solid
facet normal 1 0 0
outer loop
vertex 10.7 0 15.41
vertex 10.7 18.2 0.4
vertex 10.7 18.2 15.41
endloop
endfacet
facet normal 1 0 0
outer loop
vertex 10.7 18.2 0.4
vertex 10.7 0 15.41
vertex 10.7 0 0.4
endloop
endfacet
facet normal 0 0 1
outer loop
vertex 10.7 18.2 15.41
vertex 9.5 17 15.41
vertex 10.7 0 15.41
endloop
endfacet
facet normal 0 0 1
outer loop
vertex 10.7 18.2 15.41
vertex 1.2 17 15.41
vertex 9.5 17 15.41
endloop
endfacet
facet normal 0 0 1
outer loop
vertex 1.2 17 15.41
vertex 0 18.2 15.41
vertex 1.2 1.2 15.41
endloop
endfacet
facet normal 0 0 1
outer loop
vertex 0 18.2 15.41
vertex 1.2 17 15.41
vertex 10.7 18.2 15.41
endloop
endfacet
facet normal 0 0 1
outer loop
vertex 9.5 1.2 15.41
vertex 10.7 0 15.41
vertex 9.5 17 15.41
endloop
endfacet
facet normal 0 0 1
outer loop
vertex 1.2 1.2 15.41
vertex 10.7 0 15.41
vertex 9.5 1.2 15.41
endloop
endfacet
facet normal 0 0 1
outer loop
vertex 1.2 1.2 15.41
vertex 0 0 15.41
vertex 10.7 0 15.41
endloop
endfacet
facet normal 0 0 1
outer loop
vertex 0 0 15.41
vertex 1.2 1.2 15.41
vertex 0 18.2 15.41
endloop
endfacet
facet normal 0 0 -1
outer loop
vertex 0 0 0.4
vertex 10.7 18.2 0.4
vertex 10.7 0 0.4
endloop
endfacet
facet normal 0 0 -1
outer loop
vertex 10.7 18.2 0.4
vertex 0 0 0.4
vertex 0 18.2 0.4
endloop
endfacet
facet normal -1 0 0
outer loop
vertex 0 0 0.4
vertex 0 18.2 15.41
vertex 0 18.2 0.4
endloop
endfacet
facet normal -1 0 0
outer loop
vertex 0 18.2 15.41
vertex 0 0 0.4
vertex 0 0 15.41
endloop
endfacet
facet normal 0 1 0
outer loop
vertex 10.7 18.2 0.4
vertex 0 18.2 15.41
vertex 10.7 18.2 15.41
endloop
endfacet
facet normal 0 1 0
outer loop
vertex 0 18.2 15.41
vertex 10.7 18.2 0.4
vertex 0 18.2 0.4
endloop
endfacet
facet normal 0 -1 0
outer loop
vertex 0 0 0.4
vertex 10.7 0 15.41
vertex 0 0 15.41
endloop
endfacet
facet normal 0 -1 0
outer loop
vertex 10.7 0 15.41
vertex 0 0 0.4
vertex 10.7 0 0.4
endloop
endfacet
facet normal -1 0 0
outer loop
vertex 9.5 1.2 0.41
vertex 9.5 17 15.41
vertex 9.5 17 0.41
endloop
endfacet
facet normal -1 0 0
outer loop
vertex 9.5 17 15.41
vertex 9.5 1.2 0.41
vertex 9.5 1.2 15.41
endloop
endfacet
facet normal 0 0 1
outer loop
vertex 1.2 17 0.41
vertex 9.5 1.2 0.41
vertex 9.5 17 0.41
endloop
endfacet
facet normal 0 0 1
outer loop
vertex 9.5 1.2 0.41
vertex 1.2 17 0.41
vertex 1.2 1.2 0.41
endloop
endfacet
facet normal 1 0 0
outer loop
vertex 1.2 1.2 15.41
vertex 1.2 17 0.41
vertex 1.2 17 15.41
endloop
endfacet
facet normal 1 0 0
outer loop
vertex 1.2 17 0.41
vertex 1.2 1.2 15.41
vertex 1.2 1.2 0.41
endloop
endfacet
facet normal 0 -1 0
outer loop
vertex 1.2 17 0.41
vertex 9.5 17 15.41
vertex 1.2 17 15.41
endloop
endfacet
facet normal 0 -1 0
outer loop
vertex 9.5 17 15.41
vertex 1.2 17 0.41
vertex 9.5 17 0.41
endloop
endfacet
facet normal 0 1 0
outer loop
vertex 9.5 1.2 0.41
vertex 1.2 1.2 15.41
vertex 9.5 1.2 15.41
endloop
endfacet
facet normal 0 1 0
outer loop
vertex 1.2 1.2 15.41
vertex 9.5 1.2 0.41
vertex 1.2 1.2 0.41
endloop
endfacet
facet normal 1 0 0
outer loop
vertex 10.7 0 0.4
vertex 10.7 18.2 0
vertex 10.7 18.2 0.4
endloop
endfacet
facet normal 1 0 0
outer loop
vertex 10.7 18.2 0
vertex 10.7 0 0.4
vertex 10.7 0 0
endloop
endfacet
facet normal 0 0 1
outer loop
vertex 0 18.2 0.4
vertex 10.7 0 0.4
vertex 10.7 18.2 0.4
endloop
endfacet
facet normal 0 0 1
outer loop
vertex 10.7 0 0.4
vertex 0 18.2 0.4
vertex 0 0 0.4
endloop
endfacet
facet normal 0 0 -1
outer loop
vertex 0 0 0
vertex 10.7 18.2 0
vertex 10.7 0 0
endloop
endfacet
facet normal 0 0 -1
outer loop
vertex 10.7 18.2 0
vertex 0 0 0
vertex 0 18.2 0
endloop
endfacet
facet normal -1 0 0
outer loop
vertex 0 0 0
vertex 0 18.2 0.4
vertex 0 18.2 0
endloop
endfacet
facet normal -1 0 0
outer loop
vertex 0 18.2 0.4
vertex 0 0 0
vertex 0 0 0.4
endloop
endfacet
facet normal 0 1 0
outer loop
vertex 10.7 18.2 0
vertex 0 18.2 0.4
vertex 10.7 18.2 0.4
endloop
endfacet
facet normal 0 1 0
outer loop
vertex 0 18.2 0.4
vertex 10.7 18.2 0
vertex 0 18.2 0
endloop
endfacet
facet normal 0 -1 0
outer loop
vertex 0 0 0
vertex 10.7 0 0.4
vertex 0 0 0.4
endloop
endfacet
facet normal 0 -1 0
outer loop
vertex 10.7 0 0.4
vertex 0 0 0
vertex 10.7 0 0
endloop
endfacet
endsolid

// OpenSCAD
// file: ../../Base/Rotation.scad
// Fischertechnik Box Foundation
// Geometry Helpers Rotation

include <PlacementOptions.scad>

// getRotatedSpace(space, rotation=NoRotation)
// Rotates the space dependent on the specified rotation

function getRotatedSpace(space, rotation=NoRotation) = [
    (rotation == Rotate90 || rotation == Rotate270) ? space.y : space.x,
    (rotation == Rotate90 || rotation == Rotate270) ? space.x : space.y
];

// Rotates the given space around the fixed left lower corner
// space = the space the children needs as width/depth list [width,depth]
// rotation = 0 Rotate0 degrees, 1 Rotate90 degrees, 2 Rotate180 degrees, 3 Rotate270 degrees (equivalent to -90)

module RotateFix(space, rotation=NoRotation) {
    dy = (rotation == Rotate0 || rotation == Rotate270) ? 0 :
        (rotation == Rotate90) ? space.x :
        space.y;
    dx = (rotation < Rotate180) ? 0 :
        (rotation == Rotate180) ? space.x :
        space.y;
    
    translate([dx, dy, 0])
        rotate([0, 0, rotations[rotation]])
            children();
}
// file: ../../Base/Alignment.scad
// Fischertechnik Box Foundation
// Geometry Helpers Alignment

include <PlacementOptions.scad>

// getAlignedX(elementWidth, spaceWidth, align=AlignRight, offset=0)
// Gets the aligned X offset of an element with the given
// width in the given space.
// elementWidth = The width of the element to positon
// spaceWidth = The space where the element should be aligned
// align = 0 AlignLeft, 1 AlignCenter, 2 AlignRight
// offset = an optional offset from the aligned position. When
// aligned left or centered, then positive values are in X direction.
// When aligned right then positive values are in negative X direction.

function getAlignedX(elementWidth, spaceWidth, align=AlignRight, offset=0) =
    (align == AlignLeft) ?
        offset :
        ((align == AlignCenter) ?
        (spaceWidth - elementWidth)/2 + offset :
        spaceWidth - offset - elementWidth);

// getAlignedY(elementDepth, spaceDepth, align=AlignTop, offset=0)
// Gets the aligned Y offset of an element with the given
// depth in the given space.
// elementDepth = The depth of the element to positon
// spaceDepth = The space where the element should be aligned
// align = 0 AlignBottom, 1 AlignCenter, 2 AlignTop
// offset = an optional offset from the aligned position. When
// aligned bottom or centered, then positive values are in Y direction.
// When aligned top then positive values are in negative Y direction.

function getAlignedY(elementDepth, spaceDepth, align=AlignTop, offset=0) =
    (align == AlignBottom) ?
        offset :
        ((align == AlignCenter) ?
        (spaceDepth - elementDepth)/2 + offset :
        spaceDepth - offset - elementDepth);
// file: ../../Base/PlacementOptions.scad
// Fischertechnik Box Foundation
// Placement Options

// Alignment
NoAlign = 0;
AlignLeft = 1;
AlignBottom = 2;
AlignCenter = 3;
AlignRight = 4;
AlignTop = 5;

// Element rotation degree steps
rotations = [0, -90, -180, -270];

// Rotation
NoRotation = 0;
Rotate0 = 0;
Rotate90 = 1;
Rotate180 = 2;
Rotate270 = 3;

// Docking (seen from above)
NoDock = -1;
DockLeft = 0;
DockTop = 1;
DockRight = 2;
DockCorner = 2;
DockBottom = 3;

// Web corners
LowerLeft = 0;
UpperLeft = 1;
UpperRight = 2;
LowerRight = 3;

// Web position relative to corner
LeftOfCorner = 0;
RightOfCorner = 1;

// Rails direction
Horizontal = true;
Vertical = false;
// file: ../../Base/Boxes.scad
// Fischertechnik Box Foundation
// Pre-designed Boxes

use <Constants.scad>

include <PlacementOptions.scad>

box190Width = 190;
box190Depth = 130;
box130Width = 130;
box130Depth = 95;

// Values are from an original ec3 box
topBottomDifference = 1.5;
outerHeight = 40;
baseThickness = 1.8;
innerHeight = outerHeight - baseThickness;
stackExcess = 5.7;
radius = 3.5;
wallThickness = 1.5;
tolerance = 0.2;

boxWallThickness = wallThickness;
boxBaseThickness = baseThickness;
boxWebWidth = 3.0;

// getBoxWallThickness()
// Gets the wall thickness of a Fischertechnik Box
function getBoxWallThickness() = boxWallThickness;

// getBoxUsageHeight(height = 38.2)
// Gets the usable height of a Fischertechnik box
// height = Outer height of the box from the bottom to the upper edge.
function getBoxUsageHeight(height = outerHeight) = height - baseThickness - stackExcess;

// getBoxInnerHeight()
// Gets the inner height of a Fischertechnik box, including the stack excess
function getBoxInnerHeight() = innerHeight;

// getBoxBaseThickness()
// Gets the thickness of the Fischertechnik box base.
function getBoxBaseThickness() = boxBaseThickness;

// getBoxWebWidth()
// Gets the width of a box web
function getBoxWebWidth() = boxWebWidth;

// getBox190Space()
// Gets the usable inner space of a Box 190 as an x/y-list
function getBox190Space() = [
    box190Width - 2*getBoxWallThickness() - topBottomDifference, 
    box190Depth - 2*getBoxWallThickness() - topBottomDifference ];

// RoundedCornerPlate(width, depth, height, radius)
// Creates a body plate with rounded corners for a box. Used
// also to create the complete box with the hull module.
// width = Width of the plate
// depth = depth of the plate 
// height = thickness of the plate
// radius = radius of the rounded corner
module RoundedCornerPlate(width, depth, height, radius) {
    translate([radius, radius])
    hull() {
        w = width-2*radius;
        d = depth-2*radius;
        cube([w, d, height]);
        cylinder(height, r=radius, $fn=getFragments());
        translate([w, 0])
            cylinder(height, r=radius, $fn=getFragments());
        translate([w, d])
            cylinder(height, r=radius, $fn=getFragments());
        translate([0, d])
            cylinder(height, r=radius, $fn=getFragments());
    }
}

// BoxBase(width, depth)
// Creates an empty stackable Fischertechnik compatible box
// width = Outer width of the box (190, 130, ...)
// depth = Outer depth of the box (130, 95, ...)

module BoxBase(width, depth, height=outerHeight) {    
    thinPlate = 0.01;

    innerHeight = height - baseThickness;    
    
    module Body(tolerance=tolerance) {
        hull() {
            // Bottom with tolerance to fit into the original boxes when stacked
            translate([-wallThickness+tolerance, -wallThickness+tolerance, -baseThickness])
                RoundedCornerPlate(width-topBottomDifference-2*tolerance, depth-topBottomDifference-2*tolerance, thinPlate, radius);
            
            // Top
            translate([-wallThickness-topBottomDifference/2, -wallThickness-topBottomDifference/2, innerHeight-thinPlate])
                RoundedCornerPlate(width, depth, thinPlate, radius);
         }
    }

    module Cutoff() {
        hull() {
            coWidth = width - 2*wallThickness;
            coDepth = depth - 2*wallThickness;
            
            // Bottom
            RoundedCornerPlate(coWidth-topBottomDifference, coDepth-topBottomDifference, thinPlate, radius);

            // Top
            translate([-topBottomDifference/2, -topBottomDifference/2, innerHeight+thinPlate]) 
                RoundedCornerPlate(coWidth, coDepth, thinPlate, radius);
        }
    }
    
    difference() {        
        Body();
        Cutoff();
        stackOffset = innerHeight - stackExcess;
        translate([0, 0, stackOffset + baseThickness])
            Body(tolerance=0);
    }
}

// Creates the Fischertechnik empty box 130x190 mm and places it at position 0,0
// 190x130 are the outer sizes, the inner space is slightly smaller. Use getBox190Space() to get the inner sizes.
// The box is positioned that the usable inner space is at the 0,0,0 position.

module Box190() {
    BoxBase(box190Width, box190Depth);
}

// Gets the usable inner space of a Box 130 as an x/y-list
function getBox130Space() = [
    box130Width - 2*getBoxWallThickness() - topBottomDifference, 
    box130Depth - 2*getBoxWallThickness() - topBottomDifference ];

// Creates the Fischertechnik empty box 95x130 mm and places it at position 0,0
// 190x130 are the outer sizes, the inner space is slightly smaller. Use getBox190Space() to get the inner sizes.
// The box is positioned that the usable inner space is at the 0,0,0 position.

module Box130() {
    BoxBase(box130Width, box130Depth);
}

// Creates a web at the specified box walls
// corner 0 = LowerLeft, 1 = UpperLeft, 2 = UpperRight, 3 = LowerRight
// side 0 = LeftOfCorner, 1 = RightOfCorner
// distance = Distance in mm from the corner
// boxSpace = inner width and depth of the box (default: Box 190)
// webWidth = length of the web (default is 3 mms)
// webThickness = thickness of the web (default is 1 mm)
// height = Height of the web (standard is getBoxUsageHeight())
// sink = How much of the web is sunk into the wall

module BoxWeb(
    corner, 
    side, 
    distance, 
    boxSpace=getBox190Space(), 
    webWidth=getBoxWebWidth(), 
    webThickness=1.0, 
    height=getBoxUsageHeight(),
    sink = getBoxWallThickness()/2) {
    width = (corner % 2 == 0) ? 
            (side == LeftOfCorner ? webWidth : webThickness) :
            (side == LeftOfCorner ? webThickness : webWidth);

    depth = (corner % 2 == 0) ? 
            (side == RightOfCorner ? webWidth : webThickness) :
            (side == RightOfCorner ? webThickness : webWidth);
    
    xDiff = corner == LowerLeft ? 
                (side == LeftOfCorner ? -sink : distance) :
            (corner == UpperLeft ?                
                (side == LeftOfCorner ? distance : -sink) :
            (corner == UpperRight ?
                (side == LeftOfCorner ? boxSpace.x-webWidth+sink : boxSpace.x-distance-webThickness) :
                (side == LeftOfCorner ? boxSpace.x-distance-webThickness: boxSpace.x-webWidth+sink)));

    yDiff = corner == LowerLeft ? 
                (side == RightOfCorner ? -sink : distance) :
            (corner == UpperLeft ?
                (side == RightOfCorner ? boxSpace.y-distance-webThickness : boxSpace.y-webWidth+sink) :
            (corner == UpperRight ?
                (side == RightOfCorner ? boxSpace.y-webWidth+sink : boxSpace.y-distance-webThickness) :
                (side == RightOfCorner ? distance : -sink)));
    
    translate([xDiff, yDiff, -getExcess()])
        cube([width, depth, height + 2*getExcess()]);
}
// file: ../../Base/Placement.scad
// Fischertechnik Box Foundation
// Geometry Helpers Placement

use <Constants.scad>
use <Alignment.scad>
use <Rotation.scad>
use <Boxes.scad>

include <PlacementOptions.scad>

// Place(x=0, y=0, elementSpace=[0,0], alignX=AlignLeft, alignY=AlignBottom, rotation=Rotate0, boxSpace=getBox190Space())
// Places the child at the specified position
// y = Y-Position. This is a relative position when an X aligment is specified.
// x = X-Position. This is a relative position when an Y aligment is specified.
// elementSpace = space of the element to be placed [x,y]
// alignX = -1=NoAlign, 0 AlignLeft, 1 AlignCenter, 3 AlignRight (elementSpace and boxSpace required!)
// alignY = -1=NoAlign, 2 AlignBottom, 1 AlignCenter, 4 AlignTop (elementSpace and boxSpace required!)
// rotation = 0 Rotate0 0 degrees, 1 Rotate90 90 degrees, 
// 2 Rotate180 180 degrees, 3 Rotate270 270 degrees (equivalent to -90)
// boxSpace = Inner space of the box where the placement occurs [x,y] - default is Box 190x130 inner space

module Place(x=0, y=0, elementSpace=[0,0], 
  alignX=AlignLeft, alignY=AlignBottom, 
  rotation=NoRotation, boxSpace=getBox190Space()) {

    module Position(x, y, space, rotation=Rotate0) {
        translate([x, y, 0])
            RotateFix(space, rotation)
                children();
    }

    space = getRotatedSpace(elementSpace, rotation);
    alignedX = getAlignedX(space.x, boxSpace.x, alignX, x);
    alignedY = getAlignedY(space.y, boxSpace.y, alignY, y);
    Position(alignedX, alignedY, elementSpace, rotation)
        children();
}

// Center(space=getBox130Space(), elementSpace=[0,0])
// space = Space where the children is centered. For cylinder use centered=true and no elementSpace.
// elementSpace = space of the element to be centered [x,y]

module Center(space=getBox190Space(), elementSpace=[0,0]) {
    Place(elementSpace=elementSpace, boxSpace=space, alignX=AlignCenter, alignY=AlignCenter)
        children();
}

// CenterHorizontal(width=0, y=0, offset=0, space=getBox130Space())
// width = Width of the element to be placed.
// y = Y position of the element
// offset = Offset from the center position (negative will be left of the center)
// space = Space where the element is placed

module CenterHorizontal(width=0, y=0, offset=0, space=getBox190Space()) {
    Place(x=offset, y=y, elementSpace=[width, 0], boxSpace=space, alignX=AlignCenter)
        children(0);
}

// CenterVertical(depth=0, x=0, offset=0, space=getBox130Space())
// depth = Depth of the element to be placed.
// x = X position of the element
// offset = Offset from the center position (negative will be down of the center)
// space = Space where the element is placed

module CenterVertical(depth=0, x=0, offset=0, space=getBox190Space()) {
    Place(x=x, y=offset, elementSpace=[0, depth], boxSpace=space, alignY=AlignCenter)
        children(0);
}

// getIsVertical(align)
// True if the specified alignment needs a vertical orientation for a divider (AlignRight, AlignLeft)

function getIsVertical(align) = (align == AlignRight || align == AlignLeft);

// getIsHorizontal(align)
// True if the specified alignment needs a horizontal orientation for a divider (AlignTop, AlignBottom)

function getIsHorizontal(align) = (align == AlignTop || align == AlignBottom);
// file: ../../Elements/AxisClip10.scad
// Fischertechnik Box Library
// Axis for clip 10
// 31023

use <../ModelBase/Simple.scad>
use <../Base/Constants.scad>

/* [Element Parameters] */
height = 23;
clipHeight = 10;

/* [Hidden] */
width = 12;
depth = 12;
upperDiameter = 3.6;

// getAxisClip10Space()
// Gets the space of a n axis for a clip 10 with spring ring (mot2)

function getAxisClip10Space() = [width, depth, height];

// AxisClip10(height, clipHeight)
// Axis for clip 10 with spring ring (mot2)
// height = Height of the complete axis (standard is 23, in mot3 its only 12)
// clipHeight = Height of the part for the clip (standard is 10, in mot3 its only 7)

module AxisClip10(height=height, clipHeight=clipHeight) {
    LeveledAxisWithSpace(height, height-clipHeight, getAxisClip10Space(), diameter=upperDiameter);
}

// Test
color("lightgray")
AxisClip10(height, clipHeight);
// file: ../../Base/Constants.scad
// Fischertechnik Box Foundation
// Constants

// Constant values necessary for multiple elements

// Base constants
dividerThickness = 1.2;
excess = 0.01;
fragments = 90;
tolerance = 0.8;

// Gets the thickness of a divider 
function getDividerThickness() = dividerThickness;

// Gets the excess that is used to merge walls into each other
function getExcess() = excess;

// Gets amount of fragments of a cylinder
function getFragments() = fragments;

// Gets the inner tolerance of a frame to each side
function getTolerance() = tolerance;


// Fischertechnik specific constants
axisDiameter = 4;
axisBottomDiameter = axisDiameter + 1;
axisTolerance = 0.2;
axisLockingLength = 8;

// Gets axis diameter of Fischertechnik axis
function getAxisDiameter() = axisDiameter;

// Gets axis diameter tolerance (subtracted for element axis)
function getAxisTolerance() = axisTolerance;

// Gets the axis diameter for standing axis
function getStandAxisDiameter() = getAxisDiameter() - getAxisTolerance();

// Gets axis bottom diameter for thicker part at the bottom
function getAxisBottomDiameter() = axisBottomDiameter;

// Gets the lengthh of the locking part of a locking axis
function getAxisLockingLength() = axisLockingLength;

pinHeight = 2.5;
pinTolerance = 0.2;

// gets the height of a connecting pin
function getPinHeight() = pinHeight;

// gets the connecting pin height tolerance
function getPinTolerance() = pinTolerance;

standardEdgeDistance = 2.5;
standardWebDistance = 11.5;
standardCornerLength = 15;

// gets the standard distance to the wall of the box for dockable frames with webs
function getStandardEdgeDistance() = standardEdgeDistance;

// gets the standard distance of each web to the corner of the dockable frame
function getStandardWebDistance() = standardWebDistance;

// gets the standard length of the corner walls of a dockable frame
function getStandardCornerLength() = standardCornerLength;

tubeWallFactor = 0.8;

// gets the wall thickness of a tube.
function getTubeWallThickness() = tubeWallFactor * getDividerThickness();

smallPartsFrameHeight = 20;

// gets the frame height for docked small parts boxes.
function getSmallPartsFrameHeight() = smallPartsFrameHeight;

hubRingDiameter = 19.5;
hubRingLevelDiameter = 21;

// gets the diameter of a tube matching the inner ring of a wheel
function getHubRingDiameter() = hubRingDiameter;

// gets the diameter of a hub tube with a thicker diameter
function getHubRingLevelDiameter() = hubRingLevelDiameter;
// file: ../../Elements/FrameBlock15x30x5.scad
// Fischertechnik Box Library
// Frame for block 15x30x5 with pin
// 35049

use <../ModelBase/Simple.scad>

/* [Element Parameters] */
columns = 1;
rows = 1;

/* [Hidden] */
width = 7.5;
depth = 15;
height = 15;

// getFrameBlock15x30x5Space(columns=1, rows=1)
// Gets the space of a frame for columns x rows 15x30x5 blocks

function getFrameBlock15x30x5Space(columns=1, rows=1) = getFrameOuterVolume([width * columns, depth * rows, height]);

// FrameBlock15x30x5(columns=1, rows=1)
// frame for columns x rows small parts (7.5 or 5)

module FrameBlock15x30x5(columns=1, rows=1) {
    Frame([width * columns, depth * rows, height]);
}

// Tests
color("lightgray")
FrameBlock15x30x5(columns, rows);
// file: ../TestPrint.scad
// 3D Print Test Base

use <../Base/Constants.scad>

use <../Elements/AxisClip10.scad>

module TestPrint(elementSpace) {
    cube([elementSpace.x, elementSpace.y, 0.4]);
    translate([0,0,0.4+getExcess()]) {
        children();
    }
}

TestPrint(getAxisClip10Space())
    AxisClip10();
// main file
// 3D Print Test
// FrameBlock15x30x5

use <../TestPrint.scad>
use <../../Elements/FrameBlock15x30x5.scad>

TestPrint(getFrameBlock15x30x5Space())
    FrameBlock15x30x5();
